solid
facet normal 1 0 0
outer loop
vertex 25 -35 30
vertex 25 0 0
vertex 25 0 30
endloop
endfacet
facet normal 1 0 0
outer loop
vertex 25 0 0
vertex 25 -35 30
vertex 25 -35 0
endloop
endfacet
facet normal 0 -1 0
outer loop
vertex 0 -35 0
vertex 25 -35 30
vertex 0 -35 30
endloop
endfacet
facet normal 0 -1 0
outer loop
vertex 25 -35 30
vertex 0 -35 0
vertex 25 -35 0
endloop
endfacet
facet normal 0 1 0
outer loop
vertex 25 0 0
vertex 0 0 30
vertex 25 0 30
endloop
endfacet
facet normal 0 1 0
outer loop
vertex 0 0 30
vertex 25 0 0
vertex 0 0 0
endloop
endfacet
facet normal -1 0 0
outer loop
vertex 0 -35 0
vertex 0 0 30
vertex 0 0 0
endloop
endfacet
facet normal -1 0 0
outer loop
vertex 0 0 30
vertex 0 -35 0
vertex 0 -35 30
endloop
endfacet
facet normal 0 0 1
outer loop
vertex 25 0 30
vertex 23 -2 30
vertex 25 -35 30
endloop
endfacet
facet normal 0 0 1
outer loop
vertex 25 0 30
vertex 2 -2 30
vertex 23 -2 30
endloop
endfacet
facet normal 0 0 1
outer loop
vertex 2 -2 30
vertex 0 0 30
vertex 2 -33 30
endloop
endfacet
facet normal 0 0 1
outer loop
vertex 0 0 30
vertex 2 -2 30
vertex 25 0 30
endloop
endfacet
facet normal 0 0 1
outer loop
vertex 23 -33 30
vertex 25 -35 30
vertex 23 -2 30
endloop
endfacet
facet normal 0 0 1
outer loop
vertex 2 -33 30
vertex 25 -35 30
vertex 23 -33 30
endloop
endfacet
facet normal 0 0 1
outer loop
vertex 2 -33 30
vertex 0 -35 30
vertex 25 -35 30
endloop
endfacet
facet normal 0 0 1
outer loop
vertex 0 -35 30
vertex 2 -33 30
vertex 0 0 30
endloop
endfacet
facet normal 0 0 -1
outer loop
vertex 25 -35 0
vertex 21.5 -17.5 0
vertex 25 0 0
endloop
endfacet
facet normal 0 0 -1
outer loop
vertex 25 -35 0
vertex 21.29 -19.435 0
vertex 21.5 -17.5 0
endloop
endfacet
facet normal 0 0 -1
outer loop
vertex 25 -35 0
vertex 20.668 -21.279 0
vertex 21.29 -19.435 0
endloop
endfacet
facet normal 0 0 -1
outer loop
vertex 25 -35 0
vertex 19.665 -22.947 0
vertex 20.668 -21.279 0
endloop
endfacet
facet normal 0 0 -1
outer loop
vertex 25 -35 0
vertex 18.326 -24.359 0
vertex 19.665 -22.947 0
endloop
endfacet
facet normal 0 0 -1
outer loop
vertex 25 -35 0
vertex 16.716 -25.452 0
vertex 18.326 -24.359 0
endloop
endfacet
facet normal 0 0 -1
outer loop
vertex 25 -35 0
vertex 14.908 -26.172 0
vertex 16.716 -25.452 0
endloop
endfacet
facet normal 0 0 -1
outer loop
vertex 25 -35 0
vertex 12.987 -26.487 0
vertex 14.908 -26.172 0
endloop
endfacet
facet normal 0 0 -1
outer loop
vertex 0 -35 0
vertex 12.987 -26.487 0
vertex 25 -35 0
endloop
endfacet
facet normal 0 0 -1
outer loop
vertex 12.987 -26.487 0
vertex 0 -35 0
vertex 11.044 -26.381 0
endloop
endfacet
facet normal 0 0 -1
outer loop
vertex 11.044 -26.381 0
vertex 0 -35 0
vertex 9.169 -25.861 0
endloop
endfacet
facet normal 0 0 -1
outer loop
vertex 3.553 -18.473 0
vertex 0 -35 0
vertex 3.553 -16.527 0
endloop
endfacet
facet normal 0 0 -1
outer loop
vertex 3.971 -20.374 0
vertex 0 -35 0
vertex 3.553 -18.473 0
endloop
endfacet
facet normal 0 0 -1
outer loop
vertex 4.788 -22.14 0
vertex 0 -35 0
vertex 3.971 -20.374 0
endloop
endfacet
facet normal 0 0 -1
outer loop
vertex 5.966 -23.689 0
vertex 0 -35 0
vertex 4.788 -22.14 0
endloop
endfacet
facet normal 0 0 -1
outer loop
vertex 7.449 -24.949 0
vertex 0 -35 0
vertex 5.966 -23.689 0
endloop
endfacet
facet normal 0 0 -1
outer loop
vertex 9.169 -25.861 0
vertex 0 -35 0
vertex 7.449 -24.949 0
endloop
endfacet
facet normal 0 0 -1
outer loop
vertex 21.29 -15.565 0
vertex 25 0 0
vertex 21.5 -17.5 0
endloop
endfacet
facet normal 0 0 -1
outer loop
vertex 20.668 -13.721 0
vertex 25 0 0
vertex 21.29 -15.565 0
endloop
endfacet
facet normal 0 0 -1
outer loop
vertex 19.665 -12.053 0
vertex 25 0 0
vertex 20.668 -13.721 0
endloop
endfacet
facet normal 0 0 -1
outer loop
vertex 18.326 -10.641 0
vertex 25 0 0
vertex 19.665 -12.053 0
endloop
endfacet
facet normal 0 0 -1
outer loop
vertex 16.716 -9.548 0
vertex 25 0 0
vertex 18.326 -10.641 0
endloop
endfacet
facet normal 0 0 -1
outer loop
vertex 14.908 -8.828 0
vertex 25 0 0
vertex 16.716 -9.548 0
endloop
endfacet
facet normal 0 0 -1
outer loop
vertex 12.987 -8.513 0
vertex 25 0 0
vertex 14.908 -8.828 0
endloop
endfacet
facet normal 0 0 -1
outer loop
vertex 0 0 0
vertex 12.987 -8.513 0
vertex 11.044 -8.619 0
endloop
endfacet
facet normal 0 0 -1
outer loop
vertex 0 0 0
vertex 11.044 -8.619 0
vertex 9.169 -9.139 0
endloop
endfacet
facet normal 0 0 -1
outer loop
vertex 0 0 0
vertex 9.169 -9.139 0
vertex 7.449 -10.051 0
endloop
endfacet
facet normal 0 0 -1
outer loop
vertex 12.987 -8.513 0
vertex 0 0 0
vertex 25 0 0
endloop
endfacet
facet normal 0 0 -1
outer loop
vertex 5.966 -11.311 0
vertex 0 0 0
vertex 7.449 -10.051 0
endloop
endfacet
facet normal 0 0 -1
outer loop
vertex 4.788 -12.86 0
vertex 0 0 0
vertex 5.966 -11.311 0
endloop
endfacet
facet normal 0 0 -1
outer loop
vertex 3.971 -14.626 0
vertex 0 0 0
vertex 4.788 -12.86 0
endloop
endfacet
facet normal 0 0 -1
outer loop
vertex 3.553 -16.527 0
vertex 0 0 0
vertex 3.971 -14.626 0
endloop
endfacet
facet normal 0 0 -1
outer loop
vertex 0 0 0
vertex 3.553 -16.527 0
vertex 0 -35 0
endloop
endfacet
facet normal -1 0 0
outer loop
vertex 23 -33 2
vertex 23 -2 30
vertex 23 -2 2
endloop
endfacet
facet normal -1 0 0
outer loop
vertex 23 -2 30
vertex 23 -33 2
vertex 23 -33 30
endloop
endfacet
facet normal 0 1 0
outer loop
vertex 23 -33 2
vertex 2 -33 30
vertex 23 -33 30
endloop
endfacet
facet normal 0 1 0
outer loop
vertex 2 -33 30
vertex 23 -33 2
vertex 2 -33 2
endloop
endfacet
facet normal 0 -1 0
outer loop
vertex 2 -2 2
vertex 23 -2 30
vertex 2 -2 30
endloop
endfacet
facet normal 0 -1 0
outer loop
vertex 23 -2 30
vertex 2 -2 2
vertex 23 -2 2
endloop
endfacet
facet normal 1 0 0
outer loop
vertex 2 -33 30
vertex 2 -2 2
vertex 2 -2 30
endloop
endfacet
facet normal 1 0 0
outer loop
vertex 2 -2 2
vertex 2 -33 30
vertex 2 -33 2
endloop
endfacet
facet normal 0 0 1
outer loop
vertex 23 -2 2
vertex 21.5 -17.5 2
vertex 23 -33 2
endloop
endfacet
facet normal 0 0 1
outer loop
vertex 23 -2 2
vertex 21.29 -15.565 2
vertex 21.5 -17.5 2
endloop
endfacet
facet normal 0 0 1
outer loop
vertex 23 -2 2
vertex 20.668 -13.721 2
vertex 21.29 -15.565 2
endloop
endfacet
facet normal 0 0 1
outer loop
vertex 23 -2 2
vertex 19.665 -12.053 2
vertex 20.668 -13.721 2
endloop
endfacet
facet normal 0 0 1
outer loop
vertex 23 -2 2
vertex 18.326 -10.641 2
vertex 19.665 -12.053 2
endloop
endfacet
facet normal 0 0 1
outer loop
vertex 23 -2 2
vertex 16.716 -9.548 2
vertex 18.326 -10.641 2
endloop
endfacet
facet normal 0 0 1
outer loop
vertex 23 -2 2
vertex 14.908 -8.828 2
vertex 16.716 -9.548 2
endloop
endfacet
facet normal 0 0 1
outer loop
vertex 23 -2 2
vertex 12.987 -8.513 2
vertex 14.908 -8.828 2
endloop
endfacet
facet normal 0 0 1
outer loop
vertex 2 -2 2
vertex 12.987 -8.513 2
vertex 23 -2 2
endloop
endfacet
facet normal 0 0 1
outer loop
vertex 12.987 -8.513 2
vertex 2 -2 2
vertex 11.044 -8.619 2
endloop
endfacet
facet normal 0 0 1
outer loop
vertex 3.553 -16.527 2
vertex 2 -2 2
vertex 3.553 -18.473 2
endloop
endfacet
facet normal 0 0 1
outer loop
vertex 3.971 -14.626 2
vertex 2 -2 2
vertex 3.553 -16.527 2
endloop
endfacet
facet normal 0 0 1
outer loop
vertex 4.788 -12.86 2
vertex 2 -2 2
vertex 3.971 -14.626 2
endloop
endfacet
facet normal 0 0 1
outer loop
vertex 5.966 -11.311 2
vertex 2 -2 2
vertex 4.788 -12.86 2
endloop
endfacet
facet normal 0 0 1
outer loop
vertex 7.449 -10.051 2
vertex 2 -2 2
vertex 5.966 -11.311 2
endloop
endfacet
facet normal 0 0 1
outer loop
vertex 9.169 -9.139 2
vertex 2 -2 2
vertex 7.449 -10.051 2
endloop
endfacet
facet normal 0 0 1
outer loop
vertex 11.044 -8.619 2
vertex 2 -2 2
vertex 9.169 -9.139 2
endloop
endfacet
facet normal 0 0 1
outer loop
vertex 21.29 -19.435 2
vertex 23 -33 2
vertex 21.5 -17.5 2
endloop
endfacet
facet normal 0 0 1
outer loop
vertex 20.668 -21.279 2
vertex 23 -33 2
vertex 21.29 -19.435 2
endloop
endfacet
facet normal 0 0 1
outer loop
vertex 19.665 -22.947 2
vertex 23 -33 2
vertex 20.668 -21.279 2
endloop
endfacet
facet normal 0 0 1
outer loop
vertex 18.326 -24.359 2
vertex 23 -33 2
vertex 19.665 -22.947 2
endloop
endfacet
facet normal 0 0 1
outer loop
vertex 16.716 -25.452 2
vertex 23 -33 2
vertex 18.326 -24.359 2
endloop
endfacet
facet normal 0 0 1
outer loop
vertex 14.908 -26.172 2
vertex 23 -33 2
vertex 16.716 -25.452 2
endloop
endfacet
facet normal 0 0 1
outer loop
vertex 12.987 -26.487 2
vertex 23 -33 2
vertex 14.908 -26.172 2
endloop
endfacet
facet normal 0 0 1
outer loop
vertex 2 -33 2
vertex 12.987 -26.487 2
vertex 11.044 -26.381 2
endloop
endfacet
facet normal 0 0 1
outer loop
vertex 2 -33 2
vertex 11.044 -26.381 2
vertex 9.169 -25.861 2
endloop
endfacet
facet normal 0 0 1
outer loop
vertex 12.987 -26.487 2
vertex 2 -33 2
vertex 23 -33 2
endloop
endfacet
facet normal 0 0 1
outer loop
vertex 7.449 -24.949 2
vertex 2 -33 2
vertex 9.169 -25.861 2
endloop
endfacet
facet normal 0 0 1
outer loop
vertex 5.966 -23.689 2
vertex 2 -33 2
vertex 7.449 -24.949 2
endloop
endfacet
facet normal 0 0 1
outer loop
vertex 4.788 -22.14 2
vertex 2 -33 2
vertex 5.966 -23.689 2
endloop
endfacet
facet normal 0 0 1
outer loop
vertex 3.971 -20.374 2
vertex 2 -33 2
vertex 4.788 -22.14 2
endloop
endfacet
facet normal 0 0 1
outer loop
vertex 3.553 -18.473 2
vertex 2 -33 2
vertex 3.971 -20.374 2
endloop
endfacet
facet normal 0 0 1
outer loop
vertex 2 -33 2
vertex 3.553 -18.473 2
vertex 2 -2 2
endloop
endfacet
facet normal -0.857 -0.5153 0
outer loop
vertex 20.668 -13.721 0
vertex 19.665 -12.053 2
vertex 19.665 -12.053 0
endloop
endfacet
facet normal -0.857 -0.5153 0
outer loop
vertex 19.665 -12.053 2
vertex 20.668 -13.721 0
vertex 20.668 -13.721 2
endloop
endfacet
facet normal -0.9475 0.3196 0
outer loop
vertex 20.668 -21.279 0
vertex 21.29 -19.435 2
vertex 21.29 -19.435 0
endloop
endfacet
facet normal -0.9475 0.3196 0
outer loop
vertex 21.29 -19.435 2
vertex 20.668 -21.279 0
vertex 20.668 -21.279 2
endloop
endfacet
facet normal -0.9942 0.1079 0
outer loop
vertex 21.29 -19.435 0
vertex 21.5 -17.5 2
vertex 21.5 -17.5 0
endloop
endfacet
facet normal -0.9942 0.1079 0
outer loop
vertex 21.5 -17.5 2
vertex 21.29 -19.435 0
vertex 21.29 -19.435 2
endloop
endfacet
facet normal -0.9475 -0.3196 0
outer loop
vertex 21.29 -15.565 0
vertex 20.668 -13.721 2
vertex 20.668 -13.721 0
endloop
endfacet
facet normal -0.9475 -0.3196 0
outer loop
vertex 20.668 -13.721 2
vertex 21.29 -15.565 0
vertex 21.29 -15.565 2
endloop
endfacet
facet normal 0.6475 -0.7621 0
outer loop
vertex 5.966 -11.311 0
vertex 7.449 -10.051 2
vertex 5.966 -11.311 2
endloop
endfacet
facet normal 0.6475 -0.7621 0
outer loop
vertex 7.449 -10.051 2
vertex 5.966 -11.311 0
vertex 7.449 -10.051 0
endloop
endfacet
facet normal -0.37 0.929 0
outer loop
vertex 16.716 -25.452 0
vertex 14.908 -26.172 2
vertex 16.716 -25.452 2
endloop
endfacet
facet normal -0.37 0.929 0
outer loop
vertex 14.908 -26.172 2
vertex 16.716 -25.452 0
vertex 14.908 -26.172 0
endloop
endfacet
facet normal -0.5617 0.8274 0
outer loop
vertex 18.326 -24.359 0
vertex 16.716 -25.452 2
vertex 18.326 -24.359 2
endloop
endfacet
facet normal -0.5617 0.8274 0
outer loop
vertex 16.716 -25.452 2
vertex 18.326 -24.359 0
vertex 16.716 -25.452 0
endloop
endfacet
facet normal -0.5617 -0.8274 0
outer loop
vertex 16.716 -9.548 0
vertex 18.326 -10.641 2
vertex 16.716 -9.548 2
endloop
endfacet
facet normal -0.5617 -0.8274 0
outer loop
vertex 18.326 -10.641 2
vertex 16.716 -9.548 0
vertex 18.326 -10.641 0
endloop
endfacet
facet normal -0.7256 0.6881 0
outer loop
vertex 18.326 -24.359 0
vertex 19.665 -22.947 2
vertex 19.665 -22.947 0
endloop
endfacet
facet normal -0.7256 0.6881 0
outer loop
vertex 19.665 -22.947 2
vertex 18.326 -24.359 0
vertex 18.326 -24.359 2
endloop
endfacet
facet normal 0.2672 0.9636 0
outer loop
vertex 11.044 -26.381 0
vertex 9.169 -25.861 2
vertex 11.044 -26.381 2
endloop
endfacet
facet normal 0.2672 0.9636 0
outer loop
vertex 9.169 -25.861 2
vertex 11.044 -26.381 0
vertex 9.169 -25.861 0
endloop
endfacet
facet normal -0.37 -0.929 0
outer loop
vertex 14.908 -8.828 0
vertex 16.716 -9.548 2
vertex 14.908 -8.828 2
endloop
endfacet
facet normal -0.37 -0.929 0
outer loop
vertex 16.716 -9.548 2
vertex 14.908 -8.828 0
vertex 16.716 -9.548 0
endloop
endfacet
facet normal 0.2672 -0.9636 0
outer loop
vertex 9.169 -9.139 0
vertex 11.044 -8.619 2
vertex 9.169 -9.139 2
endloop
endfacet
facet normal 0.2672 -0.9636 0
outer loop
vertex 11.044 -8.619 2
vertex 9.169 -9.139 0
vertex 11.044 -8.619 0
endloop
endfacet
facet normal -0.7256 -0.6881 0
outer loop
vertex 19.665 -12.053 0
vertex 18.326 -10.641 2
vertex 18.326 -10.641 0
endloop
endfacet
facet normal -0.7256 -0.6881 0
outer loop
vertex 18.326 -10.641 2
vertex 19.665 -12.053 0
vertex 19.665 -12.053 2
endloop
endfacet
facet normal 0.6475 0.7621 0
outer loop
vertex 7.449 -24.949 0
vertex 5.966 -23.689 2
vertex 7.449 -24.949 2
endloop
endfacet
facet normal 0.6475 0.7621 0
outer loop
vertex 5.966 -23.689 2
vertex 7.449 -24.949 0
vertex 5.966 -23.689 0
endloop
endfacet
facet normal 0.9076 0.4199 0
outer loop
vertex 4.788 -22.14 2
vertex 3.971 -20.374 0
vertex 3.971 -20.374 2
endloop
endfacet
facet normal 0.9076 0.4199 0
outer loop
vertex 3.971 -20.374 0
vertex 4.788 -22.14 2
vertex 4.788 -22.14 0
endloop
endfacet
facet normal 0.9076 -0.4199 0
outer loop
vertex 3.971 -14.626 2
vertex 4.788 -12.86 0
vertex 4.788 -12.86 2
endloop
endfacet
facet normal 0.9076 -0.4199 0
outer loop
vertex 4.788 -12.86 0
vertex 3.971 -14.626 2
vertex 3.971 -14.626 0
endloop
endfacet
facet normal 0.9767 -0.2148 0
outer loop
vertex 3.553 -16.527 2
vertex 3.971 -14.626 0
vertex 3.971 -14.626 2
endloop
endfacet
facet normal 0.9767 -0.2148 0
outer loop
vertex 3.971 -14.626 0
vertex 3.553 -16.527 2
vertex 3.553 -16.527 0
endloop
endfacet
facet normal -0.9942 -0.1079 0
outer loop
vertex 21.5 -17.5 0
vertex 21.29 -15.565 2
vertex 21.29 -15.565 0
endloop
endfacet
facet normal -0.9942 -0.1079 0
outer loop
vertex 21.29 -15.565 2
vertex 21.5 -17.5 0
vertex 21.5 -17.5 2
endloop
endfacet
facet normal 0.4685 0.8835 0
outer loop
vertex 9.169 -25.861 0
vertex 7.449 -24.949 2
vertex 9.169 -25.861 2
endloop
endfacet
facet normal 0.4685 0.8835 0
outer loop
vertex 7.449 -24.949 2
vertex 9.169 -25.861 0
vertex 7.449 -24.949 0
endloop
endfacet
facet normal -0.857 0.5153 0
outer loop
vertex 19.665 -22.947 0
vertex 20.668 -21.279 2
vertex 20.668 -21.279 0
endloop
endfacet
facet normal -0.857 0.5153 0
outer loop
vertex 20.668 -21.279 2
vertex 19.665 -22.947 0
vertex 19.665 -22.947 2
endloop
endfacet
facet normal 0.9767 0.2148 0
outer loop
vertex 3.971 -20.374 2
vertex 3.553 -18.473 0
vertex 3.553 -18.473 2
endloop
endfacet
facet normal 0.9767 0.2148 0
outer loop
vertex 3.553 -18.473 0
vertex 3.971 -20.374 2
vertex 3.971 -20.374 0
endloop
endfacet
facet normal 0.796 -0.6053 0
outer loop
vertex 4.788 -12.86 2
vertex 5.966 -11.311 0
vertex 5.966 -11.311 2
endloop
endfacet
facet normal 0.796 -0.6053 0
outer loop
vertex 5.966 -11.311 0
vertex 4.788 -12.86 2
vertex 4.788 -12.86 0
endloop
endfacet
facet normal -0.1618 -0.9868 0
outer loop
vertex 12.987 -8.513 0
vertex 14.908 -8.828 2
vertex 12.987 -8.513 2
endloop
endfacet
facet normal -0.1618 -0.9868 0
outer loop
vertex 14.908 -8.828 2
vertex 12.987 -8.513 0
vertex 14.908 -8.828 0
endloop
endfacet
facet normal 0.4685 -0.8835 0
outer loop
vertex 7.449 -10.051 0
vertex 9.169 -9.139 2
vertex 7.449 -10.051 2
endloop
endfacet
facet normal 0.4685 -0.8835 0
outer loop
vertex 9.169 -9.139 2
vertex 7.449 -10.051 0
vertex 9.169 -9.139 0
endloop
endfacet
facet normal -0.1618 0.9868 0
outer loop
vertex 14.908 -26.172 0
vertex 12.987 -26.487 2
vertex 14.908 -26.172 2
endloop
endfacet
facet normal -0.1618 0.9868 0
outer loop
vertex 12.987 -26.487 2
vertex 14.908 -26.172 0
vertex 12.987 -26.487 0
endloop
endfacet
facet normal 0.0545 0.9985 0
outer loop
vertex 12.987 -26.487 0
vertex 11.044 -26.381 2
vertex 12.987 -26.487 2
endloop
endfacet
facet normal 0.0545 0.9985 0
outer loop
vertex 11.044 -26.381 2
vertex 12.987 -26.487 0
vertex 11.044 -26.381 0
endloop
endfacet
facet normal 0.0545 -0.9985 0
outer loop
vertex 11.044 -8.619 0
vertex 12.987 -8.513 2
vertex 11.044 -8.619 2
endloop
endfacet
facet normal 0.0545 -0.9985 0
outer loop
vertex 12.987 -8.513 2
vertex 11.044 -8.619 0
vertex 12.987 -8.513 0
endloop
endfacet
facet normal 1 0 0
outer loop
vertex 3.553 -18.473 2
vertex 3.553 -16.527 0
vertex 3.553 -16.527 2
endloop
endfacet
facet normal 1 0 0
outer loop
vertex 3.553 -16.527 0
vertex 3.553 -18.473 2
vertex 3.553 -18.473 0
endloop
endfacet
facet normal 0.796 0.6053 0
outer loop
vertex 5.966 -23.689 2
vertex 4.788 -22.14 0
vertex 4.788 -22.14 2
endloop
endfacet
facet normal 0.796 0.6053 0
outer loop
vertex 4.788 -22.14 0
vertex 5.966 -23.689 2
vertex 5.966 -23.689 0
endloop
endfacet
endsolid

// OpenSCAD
enclosureL = 25;
enclosureW = 30;
enclosureH = 35;
wallWidth = 2;

holeD = 18;


module enclosure(){
difference(){
cube([enclosureL, enclosureW, enclosureH]);
translate([wallWidth, wallWidth, wallWidth])cube([enclosureL - wallWidth*2, enclosureW - wallWidth*2 + 2, enclosureH - wallWidth*2]);
translate([enclosureL / 2, wallWidth + 1, enclosureH /2]) rotate([90, 0, 0])  cylinder(wallWidth + 2, holeD*.5, holeD*.5);
}
}

rotate([90, 0, 0])enclosure();
